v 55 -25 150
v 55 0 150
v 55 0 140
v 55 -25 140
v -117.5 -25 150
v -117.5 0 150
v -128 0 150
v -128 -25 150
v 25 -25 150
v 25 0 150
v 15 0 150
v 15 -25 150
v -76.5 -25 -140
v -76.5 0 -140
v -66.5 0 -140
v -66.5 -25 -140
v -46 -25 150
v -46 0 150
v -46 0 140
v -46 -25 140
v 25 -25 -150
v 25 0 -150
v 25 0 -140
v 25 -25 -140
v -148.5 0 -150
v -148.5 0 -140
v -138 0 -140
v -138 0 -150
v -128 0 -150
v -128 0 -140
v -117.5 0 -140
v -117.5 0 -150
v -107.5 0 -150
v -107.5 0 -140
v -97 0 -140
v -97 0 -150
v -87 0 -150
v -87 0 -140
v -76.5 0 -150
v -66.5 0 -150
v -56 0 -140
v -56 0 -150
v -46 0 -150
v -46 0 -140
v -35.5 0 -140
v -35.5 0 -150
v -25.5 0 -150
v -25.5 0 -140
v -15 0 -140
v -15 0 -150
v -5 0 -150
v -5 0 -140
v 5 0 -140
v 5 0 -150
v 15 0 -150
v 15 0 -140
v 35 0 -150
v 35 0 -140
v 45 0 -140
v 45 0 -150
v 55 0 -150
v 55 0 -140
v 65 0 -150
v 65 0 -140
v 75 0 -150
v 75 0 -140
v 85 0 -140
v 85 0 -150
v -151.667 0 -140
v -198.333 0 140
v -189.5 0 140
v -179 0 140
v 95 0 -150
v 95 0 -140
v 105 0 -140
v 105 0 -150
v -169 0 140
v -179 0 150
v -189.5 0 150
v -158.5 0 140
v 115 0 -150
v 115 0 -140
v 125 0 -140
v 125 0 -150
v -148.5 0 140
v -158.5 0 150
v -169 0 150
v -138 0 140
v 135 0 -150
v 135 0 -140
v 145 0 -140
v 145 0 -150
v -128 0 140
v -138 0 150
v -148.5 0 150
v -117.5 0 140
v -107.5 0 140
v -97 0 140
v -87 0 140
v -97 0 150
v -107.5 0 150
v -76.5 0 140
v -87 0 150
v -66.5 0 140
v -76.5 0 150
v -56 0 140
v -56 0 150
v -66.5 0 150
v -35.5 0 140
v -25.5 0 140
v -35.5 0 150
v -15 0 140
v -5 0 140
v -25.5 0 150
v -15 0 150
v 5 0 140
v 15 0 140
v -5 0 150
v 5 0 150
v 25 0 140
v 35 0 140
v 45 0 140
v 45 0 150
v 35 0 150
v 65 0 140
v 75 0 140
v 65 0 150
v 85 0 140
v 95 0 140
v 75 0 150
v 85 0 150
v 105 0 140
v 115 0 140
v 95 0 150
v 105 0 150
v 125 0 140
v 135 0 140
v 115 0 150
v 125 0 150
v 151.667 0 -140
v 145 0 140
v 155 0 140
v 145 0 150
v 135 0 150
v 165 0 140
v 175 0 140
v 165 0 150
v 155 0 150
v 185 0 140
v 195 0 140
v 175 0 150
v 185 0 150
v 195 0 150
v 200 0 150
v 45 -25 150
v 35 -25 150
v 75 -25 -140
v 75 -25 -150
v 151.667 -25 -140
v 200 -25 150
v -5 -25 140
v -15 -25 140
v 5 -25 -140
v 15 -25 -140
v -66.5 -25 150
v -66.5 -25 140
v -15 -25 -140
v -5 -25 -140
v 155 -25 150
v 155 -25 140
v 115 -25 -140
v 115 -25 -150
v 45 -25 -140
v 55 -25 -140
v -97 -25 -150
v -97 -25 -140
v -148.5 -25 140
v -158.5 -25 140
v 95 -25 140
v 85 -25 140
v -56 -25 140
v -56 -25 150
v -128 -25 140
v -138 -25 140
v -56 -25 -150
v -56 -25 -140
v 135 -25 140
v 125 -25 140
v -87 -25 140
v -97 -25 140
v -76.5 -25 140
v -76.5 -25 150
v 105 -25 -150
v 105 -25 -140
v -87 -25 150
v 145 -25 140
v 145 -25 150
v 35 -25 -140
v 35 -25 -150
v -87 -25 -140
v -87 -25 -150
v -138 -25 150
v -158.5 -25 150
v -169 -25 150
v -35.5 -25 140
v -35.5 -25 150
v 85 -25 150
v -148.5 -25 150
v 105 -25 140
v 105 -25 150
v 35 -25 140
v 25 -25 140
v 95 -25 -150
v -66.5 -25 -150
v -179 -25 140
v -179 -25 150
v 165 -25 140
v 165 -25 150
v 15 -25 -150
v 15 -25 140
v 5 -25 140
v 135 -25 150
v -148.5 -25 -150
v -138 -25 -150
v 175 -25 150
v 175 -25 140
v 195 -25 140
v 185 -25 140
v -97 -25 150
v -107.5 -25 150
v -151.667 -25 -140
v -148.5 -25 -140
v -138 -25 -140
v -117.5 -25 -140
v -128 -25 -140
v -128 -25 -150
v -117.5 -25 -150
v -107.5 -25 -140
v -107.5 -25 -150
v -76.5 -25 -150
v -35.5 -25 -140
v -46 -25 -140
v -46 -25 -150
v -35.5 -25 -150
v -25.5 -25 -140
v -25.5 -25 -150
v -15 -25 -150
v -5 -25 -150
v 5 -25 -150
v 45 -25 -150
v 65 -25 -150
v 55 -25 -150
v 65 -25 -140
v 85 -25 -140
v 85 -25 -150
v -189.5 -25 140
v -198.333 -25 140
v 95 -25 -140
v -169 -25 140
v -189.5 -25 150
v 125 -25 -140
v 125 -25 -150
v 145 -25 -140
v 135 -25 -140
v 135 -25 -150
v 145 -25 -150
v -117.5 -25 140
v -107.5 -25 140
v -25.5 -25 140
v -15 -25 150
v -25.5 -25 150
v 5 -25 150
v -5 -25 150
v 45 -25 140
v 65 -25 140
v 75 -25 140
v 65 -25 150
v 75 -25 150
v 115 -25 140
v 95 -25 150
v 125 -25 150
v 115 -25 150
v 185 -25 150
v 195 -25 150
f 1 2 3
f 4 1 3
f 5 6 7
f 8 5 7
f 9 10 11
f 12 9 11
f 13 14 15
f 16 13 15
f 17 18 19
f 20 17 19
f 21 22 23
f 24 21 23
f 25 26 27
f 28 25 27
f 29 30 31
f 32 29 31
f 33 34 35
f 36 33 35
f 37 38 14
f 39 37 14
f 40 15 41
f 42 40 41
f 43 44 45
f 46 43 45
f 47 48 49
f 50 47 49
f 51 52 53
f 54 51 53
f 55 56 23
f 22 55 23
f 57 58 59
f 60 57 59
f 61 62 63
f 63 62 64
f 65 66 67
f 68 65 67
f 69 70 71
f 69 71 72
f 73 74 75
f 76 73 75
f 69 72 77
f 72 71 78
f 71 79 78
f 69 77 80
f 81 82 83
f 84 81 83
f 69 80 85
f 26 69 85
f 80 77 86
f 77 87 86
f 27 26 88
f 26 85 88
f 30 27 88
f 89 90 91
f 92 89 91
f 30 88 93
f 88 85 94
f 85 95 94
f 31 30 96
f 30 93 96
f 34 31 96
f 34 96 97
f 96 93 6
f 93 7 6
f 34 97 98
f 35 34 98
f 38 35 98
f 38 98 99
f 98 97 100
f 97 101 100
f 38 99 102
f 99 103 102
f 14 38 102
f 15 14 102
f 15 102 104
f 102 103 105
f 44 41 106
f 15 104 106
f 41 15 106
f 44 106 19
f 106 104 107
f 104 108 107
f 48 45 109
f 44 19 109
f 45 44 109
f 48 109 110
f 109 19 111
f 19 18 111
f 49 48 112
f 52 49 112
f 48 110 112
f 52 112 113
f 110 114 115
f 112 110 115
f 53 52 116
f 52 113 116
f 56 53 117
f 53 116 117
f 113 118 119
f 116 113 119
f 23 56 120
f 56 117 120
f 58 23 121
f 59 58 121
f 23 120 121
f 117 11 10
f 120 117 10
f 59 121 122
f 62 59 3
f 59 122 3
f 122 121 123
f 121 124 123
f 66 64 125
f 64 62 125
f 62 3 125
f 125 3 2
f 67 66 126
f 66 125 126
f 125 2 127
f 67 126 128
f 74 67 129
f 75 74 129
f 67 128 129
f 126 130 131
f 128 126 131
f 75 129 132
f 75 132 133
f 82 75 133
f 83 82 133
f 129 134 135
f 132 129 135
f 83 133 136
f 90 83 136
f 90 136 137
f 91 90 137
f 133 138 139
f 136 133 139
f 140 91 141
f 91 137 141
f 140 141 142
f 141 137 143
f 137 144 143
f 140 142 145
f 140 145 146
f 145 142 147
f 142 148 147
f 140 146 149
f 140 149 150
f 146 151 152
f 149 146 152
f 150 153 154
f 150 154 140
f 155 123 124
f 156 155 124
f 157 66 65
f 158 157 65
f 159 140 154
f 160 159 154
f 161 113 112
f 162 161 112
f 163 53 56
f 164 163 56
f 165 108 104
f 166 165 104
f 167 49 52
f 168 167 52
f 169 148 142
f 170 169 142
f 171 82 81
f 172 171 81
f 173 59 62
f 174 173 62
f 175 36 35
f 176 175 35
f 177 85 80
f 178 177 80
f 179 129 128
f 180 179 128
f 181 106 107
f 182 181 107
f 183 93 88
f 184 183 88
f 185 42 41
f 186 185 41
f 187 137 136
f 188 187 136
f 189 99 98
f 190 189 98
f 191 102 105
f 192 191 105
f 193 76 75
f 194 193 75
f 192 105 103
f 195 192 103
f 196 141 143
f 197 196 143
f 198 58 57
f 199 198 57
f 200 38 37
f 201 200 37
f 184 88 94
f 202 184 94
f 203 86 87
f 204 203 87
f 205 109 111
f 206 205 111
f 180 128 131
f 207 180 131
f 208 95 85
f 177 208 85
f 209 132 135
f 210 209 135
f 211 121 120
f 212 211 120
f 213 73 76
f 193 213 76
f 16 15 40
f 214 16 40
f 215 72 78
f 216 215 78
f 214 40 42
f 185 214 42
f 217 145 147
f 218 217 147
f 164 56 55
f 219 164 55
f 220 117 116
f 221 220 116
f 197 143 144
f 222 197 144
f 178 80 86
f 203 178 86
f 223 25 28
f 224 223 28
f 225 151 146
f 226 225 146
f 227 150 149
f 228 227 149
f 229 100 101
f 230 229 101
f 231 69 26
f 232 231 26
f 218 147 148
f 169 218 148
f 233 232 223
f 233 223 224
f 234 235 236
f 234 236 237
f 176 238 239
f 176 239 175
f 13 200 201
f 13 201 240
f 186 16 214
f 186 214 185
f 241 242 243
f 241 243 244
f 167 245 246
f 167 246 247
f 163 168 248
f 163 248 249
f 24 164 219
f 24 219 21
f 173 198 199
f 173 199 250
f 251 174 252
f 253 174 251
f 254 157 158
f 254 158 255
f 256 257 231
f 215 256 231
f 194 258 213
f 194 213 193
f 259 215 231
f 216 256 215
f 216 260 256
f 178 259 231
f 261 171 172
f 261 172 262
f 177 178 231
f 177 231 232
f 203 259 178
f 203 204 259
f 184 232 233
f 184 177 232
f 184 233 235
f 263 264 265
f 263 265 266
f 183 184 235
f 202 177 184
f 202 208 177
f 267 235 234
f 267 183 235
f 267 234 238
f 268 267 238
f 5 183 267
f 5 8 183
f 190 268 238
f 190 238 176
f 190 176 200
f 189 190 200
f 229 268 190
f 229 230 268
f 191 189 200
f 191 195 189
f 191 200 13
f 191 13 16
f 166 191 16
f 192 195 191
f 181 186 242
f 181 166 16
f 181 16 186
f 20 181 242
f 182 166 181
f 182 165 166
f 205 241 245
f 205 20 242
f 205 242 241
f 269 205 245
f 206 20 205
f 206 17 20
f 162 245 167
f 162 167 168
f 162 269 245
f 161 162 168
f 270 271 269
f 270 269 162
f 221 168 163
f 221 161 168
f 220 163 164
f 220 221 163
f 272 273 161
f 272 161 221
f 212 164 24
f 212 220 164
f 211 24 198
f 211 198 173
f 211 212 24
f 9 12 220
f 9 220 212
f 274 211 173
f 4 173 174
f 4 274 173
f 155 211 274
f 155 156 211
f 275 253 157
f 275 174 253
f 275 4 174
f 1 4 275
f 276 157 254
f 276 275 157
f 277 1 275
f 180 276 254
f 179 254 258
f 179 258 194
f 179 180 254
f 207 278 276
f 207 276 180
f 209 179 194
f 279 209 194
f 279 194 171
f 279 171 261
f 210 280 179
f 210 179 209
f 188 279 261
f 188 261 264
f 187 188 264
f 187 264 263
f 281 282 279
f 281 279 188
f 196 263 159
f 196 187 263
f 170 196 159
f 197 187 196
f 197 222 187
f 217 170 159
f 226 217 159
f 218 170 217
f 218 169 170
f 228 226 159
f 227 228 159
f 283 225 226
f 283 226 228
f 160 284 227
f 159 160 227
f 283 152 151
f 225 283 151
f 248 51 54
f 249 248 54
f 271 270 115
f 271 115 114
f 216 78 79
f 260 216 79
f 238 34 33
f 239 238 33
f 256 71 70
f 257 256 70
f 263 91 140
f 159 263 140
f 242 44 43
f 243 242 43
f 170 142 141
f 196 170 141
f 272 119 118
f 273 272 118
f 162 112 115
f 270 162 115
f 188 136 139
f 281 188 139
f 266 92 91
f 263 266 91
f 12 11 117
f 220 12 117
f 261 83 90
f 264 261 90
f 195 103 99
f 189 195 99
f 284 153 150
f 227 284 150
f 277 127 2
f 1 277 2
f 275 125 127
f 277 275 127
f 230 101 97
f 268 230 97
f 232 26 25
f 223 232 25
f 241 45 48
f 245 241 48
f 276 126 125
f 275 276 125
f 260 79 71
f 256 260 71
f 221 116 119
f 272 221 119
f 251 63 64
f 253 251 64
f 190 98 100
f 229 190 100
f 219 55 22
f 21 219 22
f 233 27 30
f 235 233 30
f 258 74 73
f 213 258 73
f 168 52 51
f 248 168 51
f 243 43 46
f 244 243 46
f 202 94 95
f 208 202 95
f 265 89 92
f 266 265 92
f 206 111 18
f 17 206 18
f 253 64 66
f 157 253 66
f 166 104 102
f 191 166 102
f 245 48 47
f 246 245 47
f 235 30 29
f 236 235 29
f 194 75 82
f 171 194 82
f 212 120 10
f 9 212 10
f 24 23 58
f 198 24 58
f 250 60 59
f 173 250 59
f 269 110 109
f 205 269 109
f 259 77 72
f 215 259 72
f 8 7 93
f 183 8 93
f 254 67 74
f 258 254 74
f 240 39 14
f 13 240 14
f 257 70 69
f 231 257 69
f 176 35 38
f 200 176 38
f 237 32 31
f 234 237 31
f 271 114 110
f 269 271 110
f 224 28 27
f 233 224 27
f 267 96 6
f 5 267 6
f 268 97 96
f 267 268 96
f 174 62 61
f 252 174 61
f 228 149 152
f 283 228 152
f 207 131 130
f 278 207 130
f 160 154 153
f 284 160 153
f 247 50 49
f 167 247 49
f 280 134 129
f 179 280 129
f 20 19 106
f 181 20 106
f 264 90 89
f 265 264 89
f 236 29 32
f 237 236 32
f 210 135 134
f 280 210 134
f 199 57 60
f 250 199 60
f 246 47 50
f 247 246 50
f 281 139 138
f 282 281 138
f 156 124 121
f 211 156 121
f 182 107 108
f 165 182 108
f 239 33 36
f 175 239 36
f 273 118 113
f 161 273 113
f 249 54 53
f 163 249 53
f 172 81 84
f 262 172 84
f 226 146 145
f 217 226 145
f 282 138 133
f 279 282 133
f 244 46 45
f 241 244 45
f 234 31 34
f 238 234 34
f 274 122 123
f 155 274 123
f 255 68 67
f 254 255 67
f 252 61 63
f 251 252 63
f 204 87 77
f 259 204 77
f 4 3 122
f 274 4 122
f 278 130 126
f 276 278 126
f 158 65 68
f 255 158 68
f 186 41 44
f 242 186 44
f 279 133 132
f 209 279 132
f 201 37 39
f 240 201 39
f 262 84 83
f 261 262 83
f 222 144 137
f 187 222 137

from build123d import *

# Parameters (mm, degrees)
F1_DEPTH = 25


with BuildPart() as f1:
    # F0 (on Front) → F1 (new body)
    with BuildSketch(Plane.XZ):
        Polygon((151.666667, -140), (200, 150), (195, 150), (195, 140), (185, 140), (185, 150), (175, 150), (175, 140), (165, 140), (165, 150), (155, 150), (155, 140), (145, 140), (145, 150), (135, 150), (135, 140), (125, 140), (125, 150), (115, 150), (115, 140), (105, 140), (105, 150), (95, 150), (95, 140), (85, 140), (85, 150), (75, 150), (75, 140), (65, 140), (65, 150), (55, 150), (55, 140), (45, 140), (45, 150), (35, 150), (35, 140), (25, 140), (25, 150), (15, 150), (15, 140), (5, 140), (5, 150), (0, 150), (-5, 150), (-5, 140), (-15, 140), (-15, 150), (-25.5, 150), (-25.5, 140), (-35.5, 140), (-35.5, 150), (-46, 150), (-46, 140), (-56, 140), (-56, 150), (-66.5, 150), (-66.5, 140), (-76.5, 140), (-76.5, 150), (-87, 150), (-87, 140), (-97, 140), (-97, 150), (-107.5, 150), (-107.5, 140), (-117.5, 140), (-117.5, 150), (-128, 150), (-128, 140), (-138, 140), (-138, 150), (-148.5, 150), (-148.5, 140), (-158.5, 140), (-158.5, 150), (-169, 150), (-169, 140), (-179, 140), (-179, 150), (-189.5, 150), (-189.5, 140), (-198.333333, 140), (-151.666667, -140), (-148.5, -140), (-148.5, -150), (-138, -150), (-138, -140), (-128, -140), (-128, -150), (-117.5, -150), (-117.5, -140), (-107.5, -140), (-107.5, -150), (-97, -150), (-97, -140), (-87, -140), (-87, -150), (-76.5, -150), (-76.5, -140), (-66.5, -140), (-66.5, -150), (-56, -150), (-56, -140), (-46, -140), (-46, -150), (-35.5, -150), (-35.5, -140), (-25.5, -140), (-25.5, -150), (-15, -150), (-15, -140), (-5, -140), (-5, -150), (0, -150), (5, -150), (5, -140), (15, -140), (15, -150), (25, -150), (25, -140), (35, -140), (35, -150), (45, -150), (45, -140), (55, -140), (55, -150), (65, -150), (65, -140), (75, -140), (75, -150), (85, -150), (85, -140), (95, -140), (95, -150), (105, -150), (105, -140), (115, -140), (115, -150), (125, -150), (125, -140), (135, -140), (135, -150), (145, -150), (145, -140), align=None)
    extrude(amount=F1_DEPTH)


solid = f1.part
